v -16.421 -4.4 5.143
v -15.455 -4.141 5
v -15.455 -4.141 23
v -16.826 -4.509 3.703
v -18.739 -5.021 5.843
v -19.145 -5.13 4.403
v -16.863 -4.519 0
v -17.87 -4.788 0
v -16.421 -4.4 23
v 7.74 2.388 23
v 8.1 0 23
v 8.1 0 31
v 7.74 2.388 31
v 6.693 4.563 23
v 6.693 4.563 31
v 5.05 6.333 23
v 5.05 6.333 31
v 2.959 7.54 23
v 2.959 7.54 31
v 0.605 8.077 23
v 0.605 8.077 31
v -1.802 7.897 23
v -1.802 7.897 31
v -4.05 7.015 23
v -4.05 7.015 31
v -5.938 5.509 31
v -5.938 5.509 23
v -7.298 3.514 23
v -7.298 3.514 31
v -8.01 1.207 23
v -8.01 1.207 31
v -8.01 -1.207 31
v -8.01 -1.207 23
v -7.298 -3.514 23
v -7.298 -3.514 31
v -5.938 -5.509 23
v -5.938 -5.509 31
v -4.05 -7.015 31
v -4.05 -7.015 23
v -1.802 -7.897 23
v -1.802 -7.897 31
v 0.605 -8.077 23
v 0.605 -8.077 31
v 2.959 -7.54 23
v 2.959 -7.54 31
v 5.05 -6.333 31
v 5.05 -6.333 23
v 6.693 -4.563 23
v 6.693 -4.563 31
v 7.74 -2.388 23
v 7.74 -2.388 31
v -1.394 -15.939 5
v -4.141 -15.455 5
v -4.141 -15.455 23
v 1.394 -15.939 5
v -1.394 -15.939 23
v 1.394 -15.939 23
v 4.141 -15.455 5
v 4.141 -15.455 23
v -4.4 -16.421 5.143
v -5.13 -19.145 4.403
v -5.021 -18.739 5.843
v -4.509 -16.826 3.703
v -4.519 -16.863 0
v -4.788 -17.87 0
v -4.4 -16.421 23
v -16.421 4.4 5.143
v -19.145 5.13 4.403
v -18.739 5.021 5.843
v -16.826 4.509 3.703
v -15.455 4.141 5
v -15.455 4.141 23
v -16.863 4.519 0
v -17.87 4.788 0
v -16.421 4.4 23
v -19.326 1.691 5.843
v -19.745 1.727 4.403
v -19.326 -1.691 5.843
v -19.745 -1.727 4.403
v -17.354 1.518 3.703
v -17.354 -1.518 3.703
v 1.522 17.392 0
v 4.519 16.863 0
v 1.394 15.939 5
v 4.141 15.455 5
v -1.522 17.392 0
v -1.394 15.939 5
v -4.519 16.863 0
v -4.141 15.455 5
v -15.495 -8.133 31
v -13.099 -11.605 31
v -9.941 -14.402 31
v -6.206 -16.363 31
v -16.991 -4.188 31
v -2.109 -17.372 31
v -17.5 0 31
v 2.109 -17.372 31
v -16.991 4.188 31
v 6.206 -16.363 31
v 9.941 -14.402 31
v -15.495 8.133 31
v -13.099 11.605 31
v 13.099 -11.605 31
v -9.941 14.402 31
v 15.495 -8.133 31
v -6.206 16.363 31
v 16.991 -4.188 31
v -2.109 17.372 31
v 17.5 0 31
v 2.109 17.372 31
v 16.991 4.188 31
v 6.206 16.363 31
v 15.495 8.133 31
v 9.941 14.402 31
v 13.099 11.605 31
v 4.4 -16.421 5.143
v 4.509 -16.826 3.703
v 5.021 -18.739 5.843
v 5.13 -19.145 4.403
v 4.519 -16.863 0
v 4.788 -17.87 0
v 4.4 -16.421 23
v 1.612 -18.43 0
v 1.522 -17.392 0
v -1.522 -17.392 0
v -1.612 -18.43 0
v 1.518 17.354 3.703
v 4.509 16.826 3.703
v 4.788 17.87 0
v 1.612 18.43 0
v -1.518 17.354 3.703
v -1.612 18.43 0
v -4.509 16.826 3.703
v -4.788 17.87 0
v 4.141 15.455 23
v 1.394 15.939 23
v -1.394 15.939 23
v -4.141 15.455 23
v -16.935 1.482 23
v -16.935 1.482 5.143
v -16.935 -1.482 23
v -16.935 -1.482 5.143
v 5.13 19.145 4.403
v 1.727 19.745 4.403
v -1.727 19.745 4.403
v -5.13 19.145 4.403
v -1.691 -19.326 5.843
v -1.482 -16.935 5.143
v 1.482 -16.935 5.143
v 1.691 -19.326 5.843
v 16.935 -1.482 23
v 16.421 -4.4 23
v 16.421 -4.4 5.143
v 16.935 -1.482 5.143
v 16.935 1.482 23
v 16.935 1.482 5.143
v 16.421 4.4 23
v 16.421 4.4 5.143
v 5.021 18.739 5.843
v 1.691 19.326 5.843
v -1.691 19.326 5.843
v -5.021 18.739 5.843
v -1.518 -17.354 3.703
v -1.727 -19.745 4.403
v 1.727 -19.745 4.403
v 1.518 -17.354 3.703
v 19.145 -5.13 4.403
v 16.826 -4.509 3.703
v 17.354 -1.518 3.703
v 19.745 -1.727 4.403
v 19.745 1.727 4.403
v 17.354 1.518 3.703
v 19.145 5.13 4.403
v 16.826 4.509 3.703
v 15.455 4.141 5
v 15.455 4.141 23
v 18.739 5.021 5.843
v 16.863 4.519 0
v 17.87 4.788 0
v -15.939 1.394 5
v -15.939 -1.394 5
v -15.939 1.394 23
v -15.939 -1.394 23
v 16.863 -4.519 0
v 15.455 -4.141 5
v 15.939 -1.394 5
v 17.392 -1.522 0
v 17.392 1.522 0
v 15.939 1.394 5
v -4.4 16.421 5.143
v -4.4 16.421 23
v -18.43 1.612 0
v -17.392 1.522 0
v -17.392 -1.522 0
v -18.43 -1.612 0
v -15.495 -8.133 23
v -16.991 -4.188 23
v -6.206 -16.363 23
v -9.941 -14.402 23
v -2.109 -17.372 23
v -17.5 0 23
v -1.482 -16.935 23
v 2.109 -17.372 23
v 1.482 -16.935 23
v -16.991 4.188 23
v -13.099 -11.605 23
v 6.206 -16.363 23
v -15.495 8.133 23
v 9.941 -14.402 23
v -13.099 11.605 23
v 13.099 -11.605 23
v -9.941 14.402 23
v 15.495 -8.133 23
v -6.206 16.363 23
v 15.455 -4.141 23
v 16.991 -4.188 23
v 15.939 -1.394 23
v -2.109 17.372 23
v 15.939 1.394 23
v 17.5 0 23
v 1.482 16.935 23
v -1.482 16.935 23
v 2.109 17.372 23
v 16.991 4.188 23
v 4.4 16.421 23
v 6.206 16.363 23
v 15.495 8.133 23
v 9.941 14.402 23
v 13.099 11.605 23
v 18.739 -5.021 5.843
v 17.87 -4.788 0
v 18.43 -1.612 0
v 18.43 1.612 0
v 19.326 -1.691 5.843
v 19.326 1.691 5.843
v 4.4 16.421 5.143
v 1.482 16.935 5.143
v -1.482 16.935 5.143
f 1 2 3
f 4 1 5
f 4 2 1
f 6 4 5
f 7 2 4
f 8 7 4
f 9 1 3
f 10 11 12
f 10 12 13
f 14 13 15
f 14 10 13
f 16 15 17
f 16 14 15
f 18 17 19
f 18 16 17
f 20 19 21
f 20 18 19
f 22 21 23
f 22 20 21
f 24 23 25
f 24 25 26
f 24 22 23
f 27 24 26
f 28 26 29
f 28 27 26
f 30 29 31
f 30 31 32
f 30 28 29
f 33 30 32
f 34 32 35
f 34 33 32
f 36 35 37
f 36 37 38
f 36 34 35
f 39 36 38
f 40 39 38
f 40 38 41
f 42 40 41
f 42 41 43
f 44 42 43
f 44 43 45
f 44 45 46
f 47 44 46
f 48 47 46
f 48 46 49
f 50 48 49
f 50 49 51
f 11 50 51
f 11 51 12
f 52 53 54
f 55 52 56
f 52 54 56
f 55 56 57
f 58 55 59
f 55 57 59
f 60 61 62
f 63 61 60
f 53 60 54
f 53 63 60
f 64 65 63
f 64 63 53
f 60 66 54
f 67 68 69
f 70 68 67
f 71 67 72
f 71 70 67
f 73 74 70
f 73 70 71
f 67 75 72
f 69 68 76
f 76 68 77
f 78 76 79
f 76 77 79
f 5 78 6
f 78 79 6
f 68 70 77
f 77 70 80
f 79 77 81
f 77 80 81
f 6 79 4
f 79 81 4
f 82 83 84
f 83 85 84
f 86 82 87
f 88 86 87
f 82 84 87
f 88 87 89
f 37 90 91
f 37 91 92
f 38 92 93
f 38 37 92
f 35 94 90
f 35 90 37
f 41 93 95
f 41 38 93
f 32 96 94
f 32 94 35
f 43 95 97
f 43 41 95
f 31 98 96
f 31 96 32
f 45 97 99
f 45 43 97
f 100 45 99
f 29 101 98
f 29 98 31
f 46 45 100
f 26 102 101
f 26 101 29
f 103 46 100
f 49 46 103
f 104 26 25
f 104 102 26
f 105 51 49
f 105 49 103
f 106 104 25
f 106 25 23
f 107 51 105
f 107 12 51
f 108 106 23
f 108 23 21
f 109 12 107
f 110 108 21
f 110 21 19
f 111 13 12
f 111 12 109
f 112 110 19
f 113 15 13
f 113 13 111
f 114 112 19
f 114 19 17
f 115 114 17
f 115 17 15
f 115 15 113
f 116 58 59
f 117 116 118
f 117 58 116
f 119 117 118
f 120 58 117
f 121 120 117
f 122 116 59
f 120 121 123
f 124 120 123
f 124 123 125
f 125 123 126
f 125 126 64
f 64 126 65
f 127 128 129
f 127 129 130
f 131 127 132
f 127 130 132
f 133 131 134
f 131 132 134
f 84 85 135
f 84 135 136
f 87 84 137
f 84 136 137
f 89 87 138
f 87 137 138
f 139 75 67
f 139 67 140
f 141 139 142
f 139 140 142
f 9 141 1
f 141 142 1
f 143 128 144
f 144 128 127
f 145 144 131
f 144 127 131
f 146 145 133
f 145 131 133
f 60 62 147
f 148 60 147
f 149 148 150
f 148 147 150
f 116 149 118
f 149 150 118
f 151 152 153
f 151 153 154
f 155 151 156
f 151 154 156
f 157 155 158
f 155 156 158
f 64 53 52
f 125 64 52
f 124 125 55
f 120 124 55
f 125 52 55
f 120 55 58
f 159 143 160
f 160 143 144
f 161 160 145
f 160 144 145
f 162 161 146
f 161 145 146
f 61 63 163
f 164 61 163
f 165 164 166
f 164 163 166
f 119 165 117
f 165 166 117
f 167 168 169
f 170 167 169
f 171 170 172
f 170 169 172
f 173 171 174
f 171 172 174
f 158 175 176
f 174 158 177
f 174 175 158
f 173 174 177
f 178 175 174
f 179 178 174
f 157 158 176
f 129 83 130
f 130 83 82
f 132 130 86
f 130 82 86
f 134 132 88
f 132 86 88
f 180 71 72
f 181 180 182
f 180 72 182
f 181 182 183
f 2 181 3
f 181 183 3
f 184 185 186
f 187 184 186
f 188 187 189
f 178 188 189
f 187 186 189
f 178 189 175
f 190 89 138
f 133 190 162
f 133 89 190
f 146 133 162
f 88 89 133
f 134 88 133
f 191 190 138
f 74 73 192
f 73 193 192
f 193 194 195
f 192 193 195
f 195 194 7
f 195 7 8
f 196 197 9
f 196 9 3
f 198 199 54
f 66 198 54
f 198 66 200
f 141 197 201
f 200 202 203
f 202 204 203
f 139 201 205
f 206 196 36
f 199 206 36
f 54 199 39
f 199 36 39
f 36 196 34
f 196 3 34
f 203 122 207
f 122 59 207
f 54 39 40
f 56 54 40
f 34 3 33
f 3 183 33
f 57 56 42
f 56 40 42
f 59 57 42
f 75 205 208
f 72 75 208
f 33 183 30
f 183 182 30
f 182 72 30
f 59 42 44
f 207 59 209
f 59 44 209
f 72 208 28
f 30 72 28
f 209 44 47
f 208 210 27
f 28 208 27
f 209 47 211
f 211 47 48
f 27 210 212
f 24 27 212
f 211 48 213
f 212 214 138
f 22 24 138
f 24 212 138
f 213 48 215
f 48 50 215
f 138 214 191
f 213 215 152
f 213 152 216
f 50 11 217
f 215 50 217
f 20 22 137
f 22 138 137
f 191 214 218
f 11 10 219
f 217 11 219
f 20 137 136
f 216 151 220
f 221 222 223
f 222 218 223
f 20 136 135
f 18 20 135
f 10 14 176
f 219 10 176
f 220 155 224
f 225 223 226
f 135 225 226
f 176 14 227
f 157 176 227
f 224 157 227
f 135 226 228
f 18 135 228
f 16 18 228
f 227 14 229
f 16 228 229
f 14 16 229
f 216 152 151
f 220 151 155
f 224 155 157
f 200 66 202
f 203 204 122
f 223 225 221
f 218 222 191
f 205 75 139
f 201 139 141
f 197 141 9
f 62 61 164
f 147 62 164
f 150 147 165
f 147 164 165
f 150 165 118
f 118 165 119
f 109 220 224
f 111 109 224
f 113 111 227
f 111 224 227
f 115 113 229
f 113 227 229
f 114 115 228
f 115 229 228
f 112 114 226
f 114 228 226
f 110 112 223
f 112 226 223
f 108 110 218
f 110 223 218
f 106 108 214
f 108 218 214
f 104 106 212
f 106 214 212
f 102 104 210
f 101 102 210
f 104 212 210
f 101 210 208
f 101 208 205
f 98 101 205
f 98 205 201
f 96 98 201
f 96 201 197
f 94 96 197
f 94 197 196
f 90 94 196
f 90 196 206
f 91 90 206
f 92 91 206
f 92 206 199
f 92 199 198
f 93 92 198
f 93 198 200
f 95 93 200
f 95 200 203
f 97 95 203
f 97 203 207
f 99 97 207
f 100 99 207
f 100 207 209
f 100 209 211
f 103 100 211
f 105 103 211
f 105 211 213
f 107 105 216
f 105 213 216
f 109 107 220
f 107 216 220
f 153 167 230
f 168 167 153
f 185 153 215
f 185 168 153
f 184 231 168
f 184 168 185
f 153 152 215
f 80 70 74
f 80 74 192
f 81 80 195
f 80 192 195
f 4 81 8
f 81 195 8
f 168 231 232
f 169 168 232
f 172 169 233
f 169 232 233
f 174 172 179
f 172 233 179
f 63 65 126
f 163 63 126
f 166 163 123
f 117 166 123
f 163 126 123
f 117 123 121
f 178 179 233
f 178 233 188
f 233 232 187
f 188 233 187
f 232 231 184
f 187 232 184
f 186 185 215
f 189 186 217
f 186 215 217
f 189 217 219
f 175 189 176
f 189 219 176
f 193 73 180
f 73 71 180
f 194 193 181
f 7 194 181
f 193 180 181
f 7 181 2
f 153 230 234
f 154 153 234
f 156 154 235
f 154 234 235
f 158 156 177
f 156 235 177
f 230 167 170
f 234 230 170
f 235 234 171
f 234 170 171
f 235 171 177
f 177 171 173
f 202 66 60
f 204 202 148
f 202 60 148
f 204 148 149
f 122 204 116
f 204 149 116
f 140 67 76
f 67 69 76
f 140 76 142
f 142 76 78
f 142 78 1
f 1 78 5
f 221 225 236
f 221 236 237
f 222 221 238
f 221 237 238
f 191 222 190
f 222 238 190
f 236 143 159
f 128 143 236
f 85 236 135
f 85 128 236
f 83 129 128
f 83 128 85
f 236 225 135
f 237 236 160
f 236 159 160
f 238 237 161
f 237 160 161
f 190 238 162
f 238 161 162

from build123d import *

# Parameters (mm, degrees)
F2_R     = 17.5
F2_R_2   = 8.1
F3_DEPTH = 8
F5_DEPTH = 23


with BuildPart() as f1:
    # F0 (on Front) → F1 (revolve)
    with BuildSketch(Plane.XZ):
        Polygon((-16, 5), (-16, 23), (-17, 23), (-17, 5.142857), (-17.42, 3.702857), (-18.5, 0), (-17.458333, 0), align=None)
        Polygon((-17.42, 3.702857), (-17, 5.142857), (-19.4, 5.842857), (-19.82, 4.402857), align=None)
    revolve(axis=Axis((0, 0, 7.142946), (0, 0, 1)))

    # F2 (on face) → F3 (join)
    with BuildSketch(Plane.XY.offset(23)):
        Circle(F2_R)
        Circle(F2_R_2, mode=Mode.SUBTRACT)
    extrude(amount=F3_DEPTH)

    # F4 (on Top) → F5 (cut, through all)
    with BuildSketch(Plane.XY):
        with BuildLine():
            Line((0, 0), (-21.733331, -5.823429))
            ThreePointArc((-21.733331, -5.823429), (-15.909903, -15.909903), (-5.823429, -21.733331))
            Line((-5.823429, -21.733331), (0, 0))
        make_face()
        with BuildLine():
            Line((-21.733331, 5.823429), (0, 0))
            Line((0, 0), (-5.823429, 21.733331))
            ThreePointArc((-5.823429, 21.733331), (-15.909903, 15.909903), (-21.733331, 5.823429))
        make_face()
        with BuildLine():
            Line((5.823429, 21.733331), (0, 0))
            Line((0, 0), (21.733331, 5.823429))
            ThreePointArc((21.733331, 5.823429), (15.909903, 15.909903), (5.823429, 21.733331))
        make_face()
        with BuildLine():
            Line((21.733331, -5.823429), (0, 0))
            Line((0, 0), (5.823429, -21.733331))
            ThreePointArc((5.823429, -21.733331), (15.909903, -15.909903), (21.733331, -5.823429))
        make_face()
    extrude(amount=F5_DEPTH, mode=Mode.SUBTRACT)


solid = f1.part
